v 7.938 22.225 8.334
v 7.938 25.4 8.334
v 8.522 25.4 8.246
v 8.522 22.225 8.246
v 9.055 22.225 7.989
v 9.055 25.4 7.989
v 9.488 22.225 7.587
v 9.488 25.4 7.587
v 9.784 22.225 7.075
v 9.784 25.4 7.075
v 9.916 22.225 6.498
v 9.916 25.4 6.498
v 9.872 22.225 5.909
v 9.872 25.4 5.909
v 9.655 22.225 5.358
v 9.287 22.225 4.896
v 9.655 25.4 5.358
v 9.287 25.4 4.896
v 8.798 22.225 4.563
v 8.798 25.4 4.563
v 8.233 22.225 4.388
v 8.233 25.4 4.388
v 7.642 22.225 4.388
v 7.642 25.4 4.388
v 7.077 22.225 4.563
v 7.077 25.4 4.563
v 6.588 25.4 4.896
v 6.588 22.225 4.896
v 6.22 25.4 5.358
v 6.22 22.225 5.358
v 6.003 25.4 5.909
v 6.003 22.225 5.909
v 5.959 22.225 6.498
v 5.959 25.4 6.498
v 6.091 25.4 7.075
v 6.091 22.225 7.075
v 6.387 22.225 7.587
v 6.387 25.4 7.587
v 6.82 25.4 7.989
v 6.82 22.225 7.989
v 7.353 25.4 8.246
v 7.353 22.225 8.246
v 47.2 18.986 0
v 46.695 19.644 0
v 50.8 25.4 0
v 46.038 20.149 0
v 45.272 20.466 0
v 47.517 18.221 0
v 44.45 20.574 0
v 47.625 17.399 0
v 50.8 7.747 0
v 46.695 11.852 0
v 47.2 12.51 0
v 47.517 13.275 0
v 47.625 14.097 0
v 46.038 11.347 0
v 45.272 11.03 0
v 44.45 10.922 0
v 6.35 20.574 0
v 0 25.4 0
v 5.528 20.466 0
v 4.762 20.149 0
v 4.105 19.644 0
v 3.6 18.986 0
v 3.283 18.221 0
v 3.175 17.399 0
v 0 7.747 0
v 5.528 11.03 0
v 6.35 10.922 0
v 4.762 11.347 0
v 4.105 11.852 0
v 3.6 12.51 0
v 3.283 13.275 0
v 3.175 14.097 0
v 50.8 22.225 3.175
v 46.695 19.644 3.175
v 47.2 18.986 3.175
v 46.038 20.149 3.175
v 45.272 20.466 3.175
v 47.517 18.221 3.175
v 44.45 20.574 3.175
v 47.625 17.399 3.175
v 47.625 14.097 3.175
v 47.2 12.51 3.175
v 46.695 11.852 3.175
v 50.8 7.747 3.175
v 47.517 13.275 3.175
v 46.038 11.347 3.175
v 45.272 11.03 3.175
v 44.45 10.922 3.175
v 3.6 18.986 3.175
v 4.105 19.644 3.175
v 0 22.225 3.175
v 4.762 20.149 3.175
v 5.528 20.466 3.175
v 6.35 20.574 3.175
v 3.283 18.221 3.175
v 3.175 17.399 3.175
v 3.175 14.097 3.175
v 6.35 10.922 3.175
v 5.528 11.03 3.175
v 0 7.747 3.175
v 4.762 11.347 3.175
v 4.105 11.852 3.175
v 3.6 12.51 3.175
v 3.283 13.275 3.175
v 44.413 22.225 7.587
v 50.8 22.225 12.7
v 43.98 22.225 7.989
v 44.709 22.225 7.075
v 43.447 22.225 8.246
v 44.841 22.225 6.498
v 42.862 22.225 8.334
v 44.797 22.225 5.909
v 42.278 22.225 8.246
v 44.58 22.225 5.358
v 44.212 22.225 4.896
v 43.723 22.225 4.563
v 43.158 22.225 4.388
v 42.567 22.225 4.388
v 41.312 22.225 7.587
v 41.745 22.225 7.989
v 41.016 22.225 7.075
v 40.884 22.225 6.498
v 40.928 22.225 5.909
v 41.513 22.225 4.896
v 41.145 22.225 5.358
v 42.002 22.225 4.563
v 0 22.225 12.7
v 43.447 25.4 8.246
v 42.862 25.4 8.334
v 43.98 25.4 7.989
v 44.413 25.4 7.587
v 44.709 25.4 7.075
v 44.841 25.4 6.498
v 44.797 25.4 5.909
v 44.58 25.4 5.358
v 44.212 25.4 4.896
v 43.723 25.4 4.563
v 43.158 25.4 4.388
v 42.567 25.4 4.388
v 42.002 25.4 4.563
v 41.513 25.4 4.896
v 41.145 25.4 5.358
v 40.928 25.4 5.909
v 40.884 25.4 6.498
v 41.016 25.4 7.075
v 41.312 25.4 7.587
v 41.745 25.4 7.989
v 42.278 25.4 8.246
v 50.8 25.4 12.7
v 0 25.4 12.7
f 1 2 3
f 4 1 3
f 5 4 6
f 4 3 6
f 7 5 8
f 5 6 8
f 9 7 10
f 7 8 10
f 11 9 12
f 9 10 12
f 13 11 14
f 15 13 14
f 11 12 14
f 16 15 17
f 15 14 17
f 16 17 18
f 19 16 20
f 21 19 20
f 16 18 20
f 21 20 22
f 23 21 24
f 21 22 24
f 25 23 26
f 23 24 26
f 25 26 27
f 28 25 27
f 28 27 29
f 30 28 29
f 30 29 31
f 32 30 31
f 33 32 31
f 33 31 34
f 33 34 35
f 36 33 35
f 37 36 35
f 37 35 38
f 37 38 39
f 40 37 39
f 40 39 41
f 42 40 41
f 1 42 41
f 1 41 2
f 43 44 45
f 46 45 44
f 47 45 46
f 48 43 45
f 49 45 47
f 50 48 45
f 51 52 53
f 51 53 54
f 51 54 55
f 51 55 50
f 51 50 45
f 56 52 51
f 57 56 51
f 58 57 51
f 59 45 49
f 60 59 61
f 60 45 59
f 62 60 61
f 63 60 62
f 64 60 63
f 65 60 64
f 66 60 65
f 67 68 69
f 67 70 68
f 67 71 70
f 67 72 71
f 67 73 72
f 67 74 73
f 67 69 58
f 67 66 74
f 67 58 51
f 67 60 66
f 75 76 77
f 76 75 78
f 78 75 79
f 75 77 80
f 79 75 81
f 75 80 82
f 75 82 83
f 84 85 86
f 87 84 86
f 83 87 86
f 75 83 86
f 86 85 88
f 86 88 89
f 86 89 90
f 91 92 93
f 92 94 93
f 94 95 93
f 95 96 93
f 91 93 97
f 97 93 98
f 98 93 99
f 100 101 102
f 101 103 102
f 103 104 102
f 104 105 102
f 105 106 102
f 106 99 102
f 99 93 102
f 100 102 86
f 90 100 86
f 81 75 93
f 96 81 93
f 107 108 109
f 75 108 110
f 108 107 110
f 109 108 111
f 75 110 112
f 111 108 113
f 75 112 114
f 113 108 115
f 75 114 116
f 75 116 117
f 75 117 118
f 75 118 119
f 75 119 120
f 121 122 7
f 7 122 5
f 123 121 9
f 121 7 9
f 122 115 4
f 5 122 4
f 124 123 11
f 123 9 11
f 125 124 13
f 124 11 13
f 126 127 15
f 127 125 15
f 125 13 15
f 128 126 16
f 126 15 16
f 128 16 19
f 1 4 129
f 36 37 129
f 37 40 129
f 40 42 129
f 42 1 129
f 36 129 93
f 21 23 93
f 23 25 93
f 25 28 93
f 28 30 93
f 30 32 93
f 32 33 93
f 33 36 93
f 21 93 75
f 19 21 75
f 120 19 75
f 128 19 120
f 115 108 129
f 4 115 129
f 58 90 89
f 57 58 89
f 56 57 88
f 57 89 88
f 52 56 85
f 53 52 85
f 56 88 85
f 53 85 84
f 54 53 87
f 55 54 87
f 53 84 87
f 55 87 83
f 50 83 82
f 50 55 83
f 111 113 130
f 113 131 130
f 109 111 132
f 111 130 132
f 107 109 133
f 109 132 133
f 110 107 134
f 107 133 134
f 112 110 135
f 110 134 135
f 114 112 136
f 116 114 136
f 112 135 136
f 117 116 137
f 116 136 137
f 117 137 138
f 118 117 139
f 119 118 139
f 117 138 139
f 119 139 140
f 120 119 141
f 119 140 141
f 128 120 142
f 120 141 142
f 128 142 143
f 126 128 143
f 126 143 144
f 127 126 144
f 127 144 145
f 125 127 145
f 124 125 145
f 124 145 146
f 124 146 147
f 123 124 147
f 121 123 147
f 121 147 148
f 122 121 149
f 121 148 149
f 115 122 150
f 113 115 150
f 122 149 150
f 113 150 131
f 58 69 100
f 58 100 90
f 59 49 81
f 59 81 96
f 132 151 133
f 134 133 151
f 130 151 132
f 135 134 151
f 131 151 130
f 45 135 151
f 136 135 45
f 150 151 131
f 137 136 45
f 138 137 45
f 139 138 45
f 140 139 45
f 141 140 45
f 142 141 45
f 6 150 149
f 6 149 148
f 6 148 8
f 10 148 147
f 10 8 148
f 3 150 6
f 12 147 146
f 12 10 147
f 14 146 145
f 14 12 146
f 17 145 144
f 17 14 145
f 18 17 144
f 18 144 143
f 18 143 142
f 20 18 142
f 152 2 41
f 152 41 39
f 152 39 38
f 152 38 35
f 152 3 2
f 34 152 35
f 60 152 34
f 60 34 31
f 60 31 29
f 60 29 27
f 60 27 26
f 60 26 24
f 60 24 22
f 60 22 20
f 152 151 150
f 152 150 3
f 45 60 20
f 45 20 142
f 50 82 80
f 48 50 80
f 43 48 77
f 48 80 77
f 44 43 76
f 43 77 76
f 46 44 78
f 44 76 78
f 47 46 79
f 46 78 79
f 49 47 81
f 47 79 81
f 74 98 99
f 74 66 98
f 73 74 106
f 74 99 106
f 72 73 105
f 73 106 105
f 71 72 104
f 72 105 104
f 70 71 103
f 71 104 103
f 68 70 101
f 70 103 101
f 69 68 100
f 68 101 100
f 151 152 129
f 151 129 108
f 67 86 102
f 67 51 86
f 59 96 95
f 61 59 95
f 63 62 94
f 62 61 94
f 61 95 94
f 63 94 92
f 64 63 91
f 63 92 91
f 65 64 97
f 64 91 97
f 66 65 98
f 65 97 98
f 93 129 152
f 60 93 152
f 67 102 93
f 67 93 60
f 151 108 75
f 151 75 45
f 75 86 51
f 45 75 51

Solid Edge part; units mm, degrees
sketch "Sketch1" plane through (0, 0, 0) normal (1, 0, 0) x (0, 1, 0)
  line L0 (0, 0) -> (0, 3.175)
  line L1 (22.225, 3.175) -> (0, 3.175)
  line L2 (22.225, 25.4) -> (22.225, 3.175)
  line L3 (22.225, 25.4) -> (25.4, 25.4)
  line L4 (25.4, 25.4) -> (25.4, 0)
  line L5 (25.4, 0) -> (0, 0)
  dimension "D1" = 3.175
  dimension "D2" = 3.175
  dimension "D3" = 25.4
  dimension "D4" = 25.4
extrude "Protrusion1" add sketch "Sketch1" along normal blind 50.8
sketch "Sketch2" plane through (25.4, 12.7, 0) normal (0, 0, -1) x (-1, 0, 0)
  line L0 (-22.225, -1.778) -> (-22.225, 7.874)
  line L1 (-22.225, 7.874) -> (22.225, 7.874)
  line L2 (22.225, 7.874) -> (22.225, -1.778)
  line L3 (22.225, -1.778) -> (-22.225, -1.778)
  dimension "D1" = 3.175
  dimension "D2" = 9.652
  dimension "D3" = 4.826
  dimension "D4" = 3.175
extrude "Cutout1" cut sketch "Sketch2" against normal through all
fillet "Round_1" radius 3.175 4 edges at (3.175, 10.922, 1.5875) (47.625, 10.922, 1.5875) (47.625, 20.574, 1.5875) (3.175, 20.574, 1.5875)
sketch "Sketch3" plane through (25.4, 25.4, 12.7) normal (0, 1, 0) x (1, 0, 0)
  line L0 (-25.4, -12.7) -> (-25.4, 0)
  line L1 (-25.4, 0) -> (25.4, 0)
  line L2 (25.4, 0) -> (25.4, -12.7)
  line L3 (25.4, -12.7) -> (-25.4, -12.7)
  dimension "D1" = 12.7
extrude "Cutout2" cut sketch "Sketch3" against normal through all
hole "Hole_1" at (42.8625, 25.4, 6.35) direction (0, -1, 0) diameter 3.9675 end up to next
hole "Hole1" at (7.9375, 25.4, 6.35) direction (0, -1, 0) diameter 3.9675 end up to next
sketch "Sketch4" plane through (25.4, 12.7, 0) normal (0, 0, -1) x (-1, 0, 0)
  line L0 (-25.4, -12.7) -> (-25.4, -4.953)
  line L1 (-25.4, -4.953) -> (25.4, -4.953)
  line L2 (25.4, -4.953) -> (25.4, -12.7)
  line L3 (25.4, -12.7) -> (-25.4, -12.7)
  dimension "D1" = 3.175
extrude "Cutout3" cut sketch "Sketch4" against normal through all
